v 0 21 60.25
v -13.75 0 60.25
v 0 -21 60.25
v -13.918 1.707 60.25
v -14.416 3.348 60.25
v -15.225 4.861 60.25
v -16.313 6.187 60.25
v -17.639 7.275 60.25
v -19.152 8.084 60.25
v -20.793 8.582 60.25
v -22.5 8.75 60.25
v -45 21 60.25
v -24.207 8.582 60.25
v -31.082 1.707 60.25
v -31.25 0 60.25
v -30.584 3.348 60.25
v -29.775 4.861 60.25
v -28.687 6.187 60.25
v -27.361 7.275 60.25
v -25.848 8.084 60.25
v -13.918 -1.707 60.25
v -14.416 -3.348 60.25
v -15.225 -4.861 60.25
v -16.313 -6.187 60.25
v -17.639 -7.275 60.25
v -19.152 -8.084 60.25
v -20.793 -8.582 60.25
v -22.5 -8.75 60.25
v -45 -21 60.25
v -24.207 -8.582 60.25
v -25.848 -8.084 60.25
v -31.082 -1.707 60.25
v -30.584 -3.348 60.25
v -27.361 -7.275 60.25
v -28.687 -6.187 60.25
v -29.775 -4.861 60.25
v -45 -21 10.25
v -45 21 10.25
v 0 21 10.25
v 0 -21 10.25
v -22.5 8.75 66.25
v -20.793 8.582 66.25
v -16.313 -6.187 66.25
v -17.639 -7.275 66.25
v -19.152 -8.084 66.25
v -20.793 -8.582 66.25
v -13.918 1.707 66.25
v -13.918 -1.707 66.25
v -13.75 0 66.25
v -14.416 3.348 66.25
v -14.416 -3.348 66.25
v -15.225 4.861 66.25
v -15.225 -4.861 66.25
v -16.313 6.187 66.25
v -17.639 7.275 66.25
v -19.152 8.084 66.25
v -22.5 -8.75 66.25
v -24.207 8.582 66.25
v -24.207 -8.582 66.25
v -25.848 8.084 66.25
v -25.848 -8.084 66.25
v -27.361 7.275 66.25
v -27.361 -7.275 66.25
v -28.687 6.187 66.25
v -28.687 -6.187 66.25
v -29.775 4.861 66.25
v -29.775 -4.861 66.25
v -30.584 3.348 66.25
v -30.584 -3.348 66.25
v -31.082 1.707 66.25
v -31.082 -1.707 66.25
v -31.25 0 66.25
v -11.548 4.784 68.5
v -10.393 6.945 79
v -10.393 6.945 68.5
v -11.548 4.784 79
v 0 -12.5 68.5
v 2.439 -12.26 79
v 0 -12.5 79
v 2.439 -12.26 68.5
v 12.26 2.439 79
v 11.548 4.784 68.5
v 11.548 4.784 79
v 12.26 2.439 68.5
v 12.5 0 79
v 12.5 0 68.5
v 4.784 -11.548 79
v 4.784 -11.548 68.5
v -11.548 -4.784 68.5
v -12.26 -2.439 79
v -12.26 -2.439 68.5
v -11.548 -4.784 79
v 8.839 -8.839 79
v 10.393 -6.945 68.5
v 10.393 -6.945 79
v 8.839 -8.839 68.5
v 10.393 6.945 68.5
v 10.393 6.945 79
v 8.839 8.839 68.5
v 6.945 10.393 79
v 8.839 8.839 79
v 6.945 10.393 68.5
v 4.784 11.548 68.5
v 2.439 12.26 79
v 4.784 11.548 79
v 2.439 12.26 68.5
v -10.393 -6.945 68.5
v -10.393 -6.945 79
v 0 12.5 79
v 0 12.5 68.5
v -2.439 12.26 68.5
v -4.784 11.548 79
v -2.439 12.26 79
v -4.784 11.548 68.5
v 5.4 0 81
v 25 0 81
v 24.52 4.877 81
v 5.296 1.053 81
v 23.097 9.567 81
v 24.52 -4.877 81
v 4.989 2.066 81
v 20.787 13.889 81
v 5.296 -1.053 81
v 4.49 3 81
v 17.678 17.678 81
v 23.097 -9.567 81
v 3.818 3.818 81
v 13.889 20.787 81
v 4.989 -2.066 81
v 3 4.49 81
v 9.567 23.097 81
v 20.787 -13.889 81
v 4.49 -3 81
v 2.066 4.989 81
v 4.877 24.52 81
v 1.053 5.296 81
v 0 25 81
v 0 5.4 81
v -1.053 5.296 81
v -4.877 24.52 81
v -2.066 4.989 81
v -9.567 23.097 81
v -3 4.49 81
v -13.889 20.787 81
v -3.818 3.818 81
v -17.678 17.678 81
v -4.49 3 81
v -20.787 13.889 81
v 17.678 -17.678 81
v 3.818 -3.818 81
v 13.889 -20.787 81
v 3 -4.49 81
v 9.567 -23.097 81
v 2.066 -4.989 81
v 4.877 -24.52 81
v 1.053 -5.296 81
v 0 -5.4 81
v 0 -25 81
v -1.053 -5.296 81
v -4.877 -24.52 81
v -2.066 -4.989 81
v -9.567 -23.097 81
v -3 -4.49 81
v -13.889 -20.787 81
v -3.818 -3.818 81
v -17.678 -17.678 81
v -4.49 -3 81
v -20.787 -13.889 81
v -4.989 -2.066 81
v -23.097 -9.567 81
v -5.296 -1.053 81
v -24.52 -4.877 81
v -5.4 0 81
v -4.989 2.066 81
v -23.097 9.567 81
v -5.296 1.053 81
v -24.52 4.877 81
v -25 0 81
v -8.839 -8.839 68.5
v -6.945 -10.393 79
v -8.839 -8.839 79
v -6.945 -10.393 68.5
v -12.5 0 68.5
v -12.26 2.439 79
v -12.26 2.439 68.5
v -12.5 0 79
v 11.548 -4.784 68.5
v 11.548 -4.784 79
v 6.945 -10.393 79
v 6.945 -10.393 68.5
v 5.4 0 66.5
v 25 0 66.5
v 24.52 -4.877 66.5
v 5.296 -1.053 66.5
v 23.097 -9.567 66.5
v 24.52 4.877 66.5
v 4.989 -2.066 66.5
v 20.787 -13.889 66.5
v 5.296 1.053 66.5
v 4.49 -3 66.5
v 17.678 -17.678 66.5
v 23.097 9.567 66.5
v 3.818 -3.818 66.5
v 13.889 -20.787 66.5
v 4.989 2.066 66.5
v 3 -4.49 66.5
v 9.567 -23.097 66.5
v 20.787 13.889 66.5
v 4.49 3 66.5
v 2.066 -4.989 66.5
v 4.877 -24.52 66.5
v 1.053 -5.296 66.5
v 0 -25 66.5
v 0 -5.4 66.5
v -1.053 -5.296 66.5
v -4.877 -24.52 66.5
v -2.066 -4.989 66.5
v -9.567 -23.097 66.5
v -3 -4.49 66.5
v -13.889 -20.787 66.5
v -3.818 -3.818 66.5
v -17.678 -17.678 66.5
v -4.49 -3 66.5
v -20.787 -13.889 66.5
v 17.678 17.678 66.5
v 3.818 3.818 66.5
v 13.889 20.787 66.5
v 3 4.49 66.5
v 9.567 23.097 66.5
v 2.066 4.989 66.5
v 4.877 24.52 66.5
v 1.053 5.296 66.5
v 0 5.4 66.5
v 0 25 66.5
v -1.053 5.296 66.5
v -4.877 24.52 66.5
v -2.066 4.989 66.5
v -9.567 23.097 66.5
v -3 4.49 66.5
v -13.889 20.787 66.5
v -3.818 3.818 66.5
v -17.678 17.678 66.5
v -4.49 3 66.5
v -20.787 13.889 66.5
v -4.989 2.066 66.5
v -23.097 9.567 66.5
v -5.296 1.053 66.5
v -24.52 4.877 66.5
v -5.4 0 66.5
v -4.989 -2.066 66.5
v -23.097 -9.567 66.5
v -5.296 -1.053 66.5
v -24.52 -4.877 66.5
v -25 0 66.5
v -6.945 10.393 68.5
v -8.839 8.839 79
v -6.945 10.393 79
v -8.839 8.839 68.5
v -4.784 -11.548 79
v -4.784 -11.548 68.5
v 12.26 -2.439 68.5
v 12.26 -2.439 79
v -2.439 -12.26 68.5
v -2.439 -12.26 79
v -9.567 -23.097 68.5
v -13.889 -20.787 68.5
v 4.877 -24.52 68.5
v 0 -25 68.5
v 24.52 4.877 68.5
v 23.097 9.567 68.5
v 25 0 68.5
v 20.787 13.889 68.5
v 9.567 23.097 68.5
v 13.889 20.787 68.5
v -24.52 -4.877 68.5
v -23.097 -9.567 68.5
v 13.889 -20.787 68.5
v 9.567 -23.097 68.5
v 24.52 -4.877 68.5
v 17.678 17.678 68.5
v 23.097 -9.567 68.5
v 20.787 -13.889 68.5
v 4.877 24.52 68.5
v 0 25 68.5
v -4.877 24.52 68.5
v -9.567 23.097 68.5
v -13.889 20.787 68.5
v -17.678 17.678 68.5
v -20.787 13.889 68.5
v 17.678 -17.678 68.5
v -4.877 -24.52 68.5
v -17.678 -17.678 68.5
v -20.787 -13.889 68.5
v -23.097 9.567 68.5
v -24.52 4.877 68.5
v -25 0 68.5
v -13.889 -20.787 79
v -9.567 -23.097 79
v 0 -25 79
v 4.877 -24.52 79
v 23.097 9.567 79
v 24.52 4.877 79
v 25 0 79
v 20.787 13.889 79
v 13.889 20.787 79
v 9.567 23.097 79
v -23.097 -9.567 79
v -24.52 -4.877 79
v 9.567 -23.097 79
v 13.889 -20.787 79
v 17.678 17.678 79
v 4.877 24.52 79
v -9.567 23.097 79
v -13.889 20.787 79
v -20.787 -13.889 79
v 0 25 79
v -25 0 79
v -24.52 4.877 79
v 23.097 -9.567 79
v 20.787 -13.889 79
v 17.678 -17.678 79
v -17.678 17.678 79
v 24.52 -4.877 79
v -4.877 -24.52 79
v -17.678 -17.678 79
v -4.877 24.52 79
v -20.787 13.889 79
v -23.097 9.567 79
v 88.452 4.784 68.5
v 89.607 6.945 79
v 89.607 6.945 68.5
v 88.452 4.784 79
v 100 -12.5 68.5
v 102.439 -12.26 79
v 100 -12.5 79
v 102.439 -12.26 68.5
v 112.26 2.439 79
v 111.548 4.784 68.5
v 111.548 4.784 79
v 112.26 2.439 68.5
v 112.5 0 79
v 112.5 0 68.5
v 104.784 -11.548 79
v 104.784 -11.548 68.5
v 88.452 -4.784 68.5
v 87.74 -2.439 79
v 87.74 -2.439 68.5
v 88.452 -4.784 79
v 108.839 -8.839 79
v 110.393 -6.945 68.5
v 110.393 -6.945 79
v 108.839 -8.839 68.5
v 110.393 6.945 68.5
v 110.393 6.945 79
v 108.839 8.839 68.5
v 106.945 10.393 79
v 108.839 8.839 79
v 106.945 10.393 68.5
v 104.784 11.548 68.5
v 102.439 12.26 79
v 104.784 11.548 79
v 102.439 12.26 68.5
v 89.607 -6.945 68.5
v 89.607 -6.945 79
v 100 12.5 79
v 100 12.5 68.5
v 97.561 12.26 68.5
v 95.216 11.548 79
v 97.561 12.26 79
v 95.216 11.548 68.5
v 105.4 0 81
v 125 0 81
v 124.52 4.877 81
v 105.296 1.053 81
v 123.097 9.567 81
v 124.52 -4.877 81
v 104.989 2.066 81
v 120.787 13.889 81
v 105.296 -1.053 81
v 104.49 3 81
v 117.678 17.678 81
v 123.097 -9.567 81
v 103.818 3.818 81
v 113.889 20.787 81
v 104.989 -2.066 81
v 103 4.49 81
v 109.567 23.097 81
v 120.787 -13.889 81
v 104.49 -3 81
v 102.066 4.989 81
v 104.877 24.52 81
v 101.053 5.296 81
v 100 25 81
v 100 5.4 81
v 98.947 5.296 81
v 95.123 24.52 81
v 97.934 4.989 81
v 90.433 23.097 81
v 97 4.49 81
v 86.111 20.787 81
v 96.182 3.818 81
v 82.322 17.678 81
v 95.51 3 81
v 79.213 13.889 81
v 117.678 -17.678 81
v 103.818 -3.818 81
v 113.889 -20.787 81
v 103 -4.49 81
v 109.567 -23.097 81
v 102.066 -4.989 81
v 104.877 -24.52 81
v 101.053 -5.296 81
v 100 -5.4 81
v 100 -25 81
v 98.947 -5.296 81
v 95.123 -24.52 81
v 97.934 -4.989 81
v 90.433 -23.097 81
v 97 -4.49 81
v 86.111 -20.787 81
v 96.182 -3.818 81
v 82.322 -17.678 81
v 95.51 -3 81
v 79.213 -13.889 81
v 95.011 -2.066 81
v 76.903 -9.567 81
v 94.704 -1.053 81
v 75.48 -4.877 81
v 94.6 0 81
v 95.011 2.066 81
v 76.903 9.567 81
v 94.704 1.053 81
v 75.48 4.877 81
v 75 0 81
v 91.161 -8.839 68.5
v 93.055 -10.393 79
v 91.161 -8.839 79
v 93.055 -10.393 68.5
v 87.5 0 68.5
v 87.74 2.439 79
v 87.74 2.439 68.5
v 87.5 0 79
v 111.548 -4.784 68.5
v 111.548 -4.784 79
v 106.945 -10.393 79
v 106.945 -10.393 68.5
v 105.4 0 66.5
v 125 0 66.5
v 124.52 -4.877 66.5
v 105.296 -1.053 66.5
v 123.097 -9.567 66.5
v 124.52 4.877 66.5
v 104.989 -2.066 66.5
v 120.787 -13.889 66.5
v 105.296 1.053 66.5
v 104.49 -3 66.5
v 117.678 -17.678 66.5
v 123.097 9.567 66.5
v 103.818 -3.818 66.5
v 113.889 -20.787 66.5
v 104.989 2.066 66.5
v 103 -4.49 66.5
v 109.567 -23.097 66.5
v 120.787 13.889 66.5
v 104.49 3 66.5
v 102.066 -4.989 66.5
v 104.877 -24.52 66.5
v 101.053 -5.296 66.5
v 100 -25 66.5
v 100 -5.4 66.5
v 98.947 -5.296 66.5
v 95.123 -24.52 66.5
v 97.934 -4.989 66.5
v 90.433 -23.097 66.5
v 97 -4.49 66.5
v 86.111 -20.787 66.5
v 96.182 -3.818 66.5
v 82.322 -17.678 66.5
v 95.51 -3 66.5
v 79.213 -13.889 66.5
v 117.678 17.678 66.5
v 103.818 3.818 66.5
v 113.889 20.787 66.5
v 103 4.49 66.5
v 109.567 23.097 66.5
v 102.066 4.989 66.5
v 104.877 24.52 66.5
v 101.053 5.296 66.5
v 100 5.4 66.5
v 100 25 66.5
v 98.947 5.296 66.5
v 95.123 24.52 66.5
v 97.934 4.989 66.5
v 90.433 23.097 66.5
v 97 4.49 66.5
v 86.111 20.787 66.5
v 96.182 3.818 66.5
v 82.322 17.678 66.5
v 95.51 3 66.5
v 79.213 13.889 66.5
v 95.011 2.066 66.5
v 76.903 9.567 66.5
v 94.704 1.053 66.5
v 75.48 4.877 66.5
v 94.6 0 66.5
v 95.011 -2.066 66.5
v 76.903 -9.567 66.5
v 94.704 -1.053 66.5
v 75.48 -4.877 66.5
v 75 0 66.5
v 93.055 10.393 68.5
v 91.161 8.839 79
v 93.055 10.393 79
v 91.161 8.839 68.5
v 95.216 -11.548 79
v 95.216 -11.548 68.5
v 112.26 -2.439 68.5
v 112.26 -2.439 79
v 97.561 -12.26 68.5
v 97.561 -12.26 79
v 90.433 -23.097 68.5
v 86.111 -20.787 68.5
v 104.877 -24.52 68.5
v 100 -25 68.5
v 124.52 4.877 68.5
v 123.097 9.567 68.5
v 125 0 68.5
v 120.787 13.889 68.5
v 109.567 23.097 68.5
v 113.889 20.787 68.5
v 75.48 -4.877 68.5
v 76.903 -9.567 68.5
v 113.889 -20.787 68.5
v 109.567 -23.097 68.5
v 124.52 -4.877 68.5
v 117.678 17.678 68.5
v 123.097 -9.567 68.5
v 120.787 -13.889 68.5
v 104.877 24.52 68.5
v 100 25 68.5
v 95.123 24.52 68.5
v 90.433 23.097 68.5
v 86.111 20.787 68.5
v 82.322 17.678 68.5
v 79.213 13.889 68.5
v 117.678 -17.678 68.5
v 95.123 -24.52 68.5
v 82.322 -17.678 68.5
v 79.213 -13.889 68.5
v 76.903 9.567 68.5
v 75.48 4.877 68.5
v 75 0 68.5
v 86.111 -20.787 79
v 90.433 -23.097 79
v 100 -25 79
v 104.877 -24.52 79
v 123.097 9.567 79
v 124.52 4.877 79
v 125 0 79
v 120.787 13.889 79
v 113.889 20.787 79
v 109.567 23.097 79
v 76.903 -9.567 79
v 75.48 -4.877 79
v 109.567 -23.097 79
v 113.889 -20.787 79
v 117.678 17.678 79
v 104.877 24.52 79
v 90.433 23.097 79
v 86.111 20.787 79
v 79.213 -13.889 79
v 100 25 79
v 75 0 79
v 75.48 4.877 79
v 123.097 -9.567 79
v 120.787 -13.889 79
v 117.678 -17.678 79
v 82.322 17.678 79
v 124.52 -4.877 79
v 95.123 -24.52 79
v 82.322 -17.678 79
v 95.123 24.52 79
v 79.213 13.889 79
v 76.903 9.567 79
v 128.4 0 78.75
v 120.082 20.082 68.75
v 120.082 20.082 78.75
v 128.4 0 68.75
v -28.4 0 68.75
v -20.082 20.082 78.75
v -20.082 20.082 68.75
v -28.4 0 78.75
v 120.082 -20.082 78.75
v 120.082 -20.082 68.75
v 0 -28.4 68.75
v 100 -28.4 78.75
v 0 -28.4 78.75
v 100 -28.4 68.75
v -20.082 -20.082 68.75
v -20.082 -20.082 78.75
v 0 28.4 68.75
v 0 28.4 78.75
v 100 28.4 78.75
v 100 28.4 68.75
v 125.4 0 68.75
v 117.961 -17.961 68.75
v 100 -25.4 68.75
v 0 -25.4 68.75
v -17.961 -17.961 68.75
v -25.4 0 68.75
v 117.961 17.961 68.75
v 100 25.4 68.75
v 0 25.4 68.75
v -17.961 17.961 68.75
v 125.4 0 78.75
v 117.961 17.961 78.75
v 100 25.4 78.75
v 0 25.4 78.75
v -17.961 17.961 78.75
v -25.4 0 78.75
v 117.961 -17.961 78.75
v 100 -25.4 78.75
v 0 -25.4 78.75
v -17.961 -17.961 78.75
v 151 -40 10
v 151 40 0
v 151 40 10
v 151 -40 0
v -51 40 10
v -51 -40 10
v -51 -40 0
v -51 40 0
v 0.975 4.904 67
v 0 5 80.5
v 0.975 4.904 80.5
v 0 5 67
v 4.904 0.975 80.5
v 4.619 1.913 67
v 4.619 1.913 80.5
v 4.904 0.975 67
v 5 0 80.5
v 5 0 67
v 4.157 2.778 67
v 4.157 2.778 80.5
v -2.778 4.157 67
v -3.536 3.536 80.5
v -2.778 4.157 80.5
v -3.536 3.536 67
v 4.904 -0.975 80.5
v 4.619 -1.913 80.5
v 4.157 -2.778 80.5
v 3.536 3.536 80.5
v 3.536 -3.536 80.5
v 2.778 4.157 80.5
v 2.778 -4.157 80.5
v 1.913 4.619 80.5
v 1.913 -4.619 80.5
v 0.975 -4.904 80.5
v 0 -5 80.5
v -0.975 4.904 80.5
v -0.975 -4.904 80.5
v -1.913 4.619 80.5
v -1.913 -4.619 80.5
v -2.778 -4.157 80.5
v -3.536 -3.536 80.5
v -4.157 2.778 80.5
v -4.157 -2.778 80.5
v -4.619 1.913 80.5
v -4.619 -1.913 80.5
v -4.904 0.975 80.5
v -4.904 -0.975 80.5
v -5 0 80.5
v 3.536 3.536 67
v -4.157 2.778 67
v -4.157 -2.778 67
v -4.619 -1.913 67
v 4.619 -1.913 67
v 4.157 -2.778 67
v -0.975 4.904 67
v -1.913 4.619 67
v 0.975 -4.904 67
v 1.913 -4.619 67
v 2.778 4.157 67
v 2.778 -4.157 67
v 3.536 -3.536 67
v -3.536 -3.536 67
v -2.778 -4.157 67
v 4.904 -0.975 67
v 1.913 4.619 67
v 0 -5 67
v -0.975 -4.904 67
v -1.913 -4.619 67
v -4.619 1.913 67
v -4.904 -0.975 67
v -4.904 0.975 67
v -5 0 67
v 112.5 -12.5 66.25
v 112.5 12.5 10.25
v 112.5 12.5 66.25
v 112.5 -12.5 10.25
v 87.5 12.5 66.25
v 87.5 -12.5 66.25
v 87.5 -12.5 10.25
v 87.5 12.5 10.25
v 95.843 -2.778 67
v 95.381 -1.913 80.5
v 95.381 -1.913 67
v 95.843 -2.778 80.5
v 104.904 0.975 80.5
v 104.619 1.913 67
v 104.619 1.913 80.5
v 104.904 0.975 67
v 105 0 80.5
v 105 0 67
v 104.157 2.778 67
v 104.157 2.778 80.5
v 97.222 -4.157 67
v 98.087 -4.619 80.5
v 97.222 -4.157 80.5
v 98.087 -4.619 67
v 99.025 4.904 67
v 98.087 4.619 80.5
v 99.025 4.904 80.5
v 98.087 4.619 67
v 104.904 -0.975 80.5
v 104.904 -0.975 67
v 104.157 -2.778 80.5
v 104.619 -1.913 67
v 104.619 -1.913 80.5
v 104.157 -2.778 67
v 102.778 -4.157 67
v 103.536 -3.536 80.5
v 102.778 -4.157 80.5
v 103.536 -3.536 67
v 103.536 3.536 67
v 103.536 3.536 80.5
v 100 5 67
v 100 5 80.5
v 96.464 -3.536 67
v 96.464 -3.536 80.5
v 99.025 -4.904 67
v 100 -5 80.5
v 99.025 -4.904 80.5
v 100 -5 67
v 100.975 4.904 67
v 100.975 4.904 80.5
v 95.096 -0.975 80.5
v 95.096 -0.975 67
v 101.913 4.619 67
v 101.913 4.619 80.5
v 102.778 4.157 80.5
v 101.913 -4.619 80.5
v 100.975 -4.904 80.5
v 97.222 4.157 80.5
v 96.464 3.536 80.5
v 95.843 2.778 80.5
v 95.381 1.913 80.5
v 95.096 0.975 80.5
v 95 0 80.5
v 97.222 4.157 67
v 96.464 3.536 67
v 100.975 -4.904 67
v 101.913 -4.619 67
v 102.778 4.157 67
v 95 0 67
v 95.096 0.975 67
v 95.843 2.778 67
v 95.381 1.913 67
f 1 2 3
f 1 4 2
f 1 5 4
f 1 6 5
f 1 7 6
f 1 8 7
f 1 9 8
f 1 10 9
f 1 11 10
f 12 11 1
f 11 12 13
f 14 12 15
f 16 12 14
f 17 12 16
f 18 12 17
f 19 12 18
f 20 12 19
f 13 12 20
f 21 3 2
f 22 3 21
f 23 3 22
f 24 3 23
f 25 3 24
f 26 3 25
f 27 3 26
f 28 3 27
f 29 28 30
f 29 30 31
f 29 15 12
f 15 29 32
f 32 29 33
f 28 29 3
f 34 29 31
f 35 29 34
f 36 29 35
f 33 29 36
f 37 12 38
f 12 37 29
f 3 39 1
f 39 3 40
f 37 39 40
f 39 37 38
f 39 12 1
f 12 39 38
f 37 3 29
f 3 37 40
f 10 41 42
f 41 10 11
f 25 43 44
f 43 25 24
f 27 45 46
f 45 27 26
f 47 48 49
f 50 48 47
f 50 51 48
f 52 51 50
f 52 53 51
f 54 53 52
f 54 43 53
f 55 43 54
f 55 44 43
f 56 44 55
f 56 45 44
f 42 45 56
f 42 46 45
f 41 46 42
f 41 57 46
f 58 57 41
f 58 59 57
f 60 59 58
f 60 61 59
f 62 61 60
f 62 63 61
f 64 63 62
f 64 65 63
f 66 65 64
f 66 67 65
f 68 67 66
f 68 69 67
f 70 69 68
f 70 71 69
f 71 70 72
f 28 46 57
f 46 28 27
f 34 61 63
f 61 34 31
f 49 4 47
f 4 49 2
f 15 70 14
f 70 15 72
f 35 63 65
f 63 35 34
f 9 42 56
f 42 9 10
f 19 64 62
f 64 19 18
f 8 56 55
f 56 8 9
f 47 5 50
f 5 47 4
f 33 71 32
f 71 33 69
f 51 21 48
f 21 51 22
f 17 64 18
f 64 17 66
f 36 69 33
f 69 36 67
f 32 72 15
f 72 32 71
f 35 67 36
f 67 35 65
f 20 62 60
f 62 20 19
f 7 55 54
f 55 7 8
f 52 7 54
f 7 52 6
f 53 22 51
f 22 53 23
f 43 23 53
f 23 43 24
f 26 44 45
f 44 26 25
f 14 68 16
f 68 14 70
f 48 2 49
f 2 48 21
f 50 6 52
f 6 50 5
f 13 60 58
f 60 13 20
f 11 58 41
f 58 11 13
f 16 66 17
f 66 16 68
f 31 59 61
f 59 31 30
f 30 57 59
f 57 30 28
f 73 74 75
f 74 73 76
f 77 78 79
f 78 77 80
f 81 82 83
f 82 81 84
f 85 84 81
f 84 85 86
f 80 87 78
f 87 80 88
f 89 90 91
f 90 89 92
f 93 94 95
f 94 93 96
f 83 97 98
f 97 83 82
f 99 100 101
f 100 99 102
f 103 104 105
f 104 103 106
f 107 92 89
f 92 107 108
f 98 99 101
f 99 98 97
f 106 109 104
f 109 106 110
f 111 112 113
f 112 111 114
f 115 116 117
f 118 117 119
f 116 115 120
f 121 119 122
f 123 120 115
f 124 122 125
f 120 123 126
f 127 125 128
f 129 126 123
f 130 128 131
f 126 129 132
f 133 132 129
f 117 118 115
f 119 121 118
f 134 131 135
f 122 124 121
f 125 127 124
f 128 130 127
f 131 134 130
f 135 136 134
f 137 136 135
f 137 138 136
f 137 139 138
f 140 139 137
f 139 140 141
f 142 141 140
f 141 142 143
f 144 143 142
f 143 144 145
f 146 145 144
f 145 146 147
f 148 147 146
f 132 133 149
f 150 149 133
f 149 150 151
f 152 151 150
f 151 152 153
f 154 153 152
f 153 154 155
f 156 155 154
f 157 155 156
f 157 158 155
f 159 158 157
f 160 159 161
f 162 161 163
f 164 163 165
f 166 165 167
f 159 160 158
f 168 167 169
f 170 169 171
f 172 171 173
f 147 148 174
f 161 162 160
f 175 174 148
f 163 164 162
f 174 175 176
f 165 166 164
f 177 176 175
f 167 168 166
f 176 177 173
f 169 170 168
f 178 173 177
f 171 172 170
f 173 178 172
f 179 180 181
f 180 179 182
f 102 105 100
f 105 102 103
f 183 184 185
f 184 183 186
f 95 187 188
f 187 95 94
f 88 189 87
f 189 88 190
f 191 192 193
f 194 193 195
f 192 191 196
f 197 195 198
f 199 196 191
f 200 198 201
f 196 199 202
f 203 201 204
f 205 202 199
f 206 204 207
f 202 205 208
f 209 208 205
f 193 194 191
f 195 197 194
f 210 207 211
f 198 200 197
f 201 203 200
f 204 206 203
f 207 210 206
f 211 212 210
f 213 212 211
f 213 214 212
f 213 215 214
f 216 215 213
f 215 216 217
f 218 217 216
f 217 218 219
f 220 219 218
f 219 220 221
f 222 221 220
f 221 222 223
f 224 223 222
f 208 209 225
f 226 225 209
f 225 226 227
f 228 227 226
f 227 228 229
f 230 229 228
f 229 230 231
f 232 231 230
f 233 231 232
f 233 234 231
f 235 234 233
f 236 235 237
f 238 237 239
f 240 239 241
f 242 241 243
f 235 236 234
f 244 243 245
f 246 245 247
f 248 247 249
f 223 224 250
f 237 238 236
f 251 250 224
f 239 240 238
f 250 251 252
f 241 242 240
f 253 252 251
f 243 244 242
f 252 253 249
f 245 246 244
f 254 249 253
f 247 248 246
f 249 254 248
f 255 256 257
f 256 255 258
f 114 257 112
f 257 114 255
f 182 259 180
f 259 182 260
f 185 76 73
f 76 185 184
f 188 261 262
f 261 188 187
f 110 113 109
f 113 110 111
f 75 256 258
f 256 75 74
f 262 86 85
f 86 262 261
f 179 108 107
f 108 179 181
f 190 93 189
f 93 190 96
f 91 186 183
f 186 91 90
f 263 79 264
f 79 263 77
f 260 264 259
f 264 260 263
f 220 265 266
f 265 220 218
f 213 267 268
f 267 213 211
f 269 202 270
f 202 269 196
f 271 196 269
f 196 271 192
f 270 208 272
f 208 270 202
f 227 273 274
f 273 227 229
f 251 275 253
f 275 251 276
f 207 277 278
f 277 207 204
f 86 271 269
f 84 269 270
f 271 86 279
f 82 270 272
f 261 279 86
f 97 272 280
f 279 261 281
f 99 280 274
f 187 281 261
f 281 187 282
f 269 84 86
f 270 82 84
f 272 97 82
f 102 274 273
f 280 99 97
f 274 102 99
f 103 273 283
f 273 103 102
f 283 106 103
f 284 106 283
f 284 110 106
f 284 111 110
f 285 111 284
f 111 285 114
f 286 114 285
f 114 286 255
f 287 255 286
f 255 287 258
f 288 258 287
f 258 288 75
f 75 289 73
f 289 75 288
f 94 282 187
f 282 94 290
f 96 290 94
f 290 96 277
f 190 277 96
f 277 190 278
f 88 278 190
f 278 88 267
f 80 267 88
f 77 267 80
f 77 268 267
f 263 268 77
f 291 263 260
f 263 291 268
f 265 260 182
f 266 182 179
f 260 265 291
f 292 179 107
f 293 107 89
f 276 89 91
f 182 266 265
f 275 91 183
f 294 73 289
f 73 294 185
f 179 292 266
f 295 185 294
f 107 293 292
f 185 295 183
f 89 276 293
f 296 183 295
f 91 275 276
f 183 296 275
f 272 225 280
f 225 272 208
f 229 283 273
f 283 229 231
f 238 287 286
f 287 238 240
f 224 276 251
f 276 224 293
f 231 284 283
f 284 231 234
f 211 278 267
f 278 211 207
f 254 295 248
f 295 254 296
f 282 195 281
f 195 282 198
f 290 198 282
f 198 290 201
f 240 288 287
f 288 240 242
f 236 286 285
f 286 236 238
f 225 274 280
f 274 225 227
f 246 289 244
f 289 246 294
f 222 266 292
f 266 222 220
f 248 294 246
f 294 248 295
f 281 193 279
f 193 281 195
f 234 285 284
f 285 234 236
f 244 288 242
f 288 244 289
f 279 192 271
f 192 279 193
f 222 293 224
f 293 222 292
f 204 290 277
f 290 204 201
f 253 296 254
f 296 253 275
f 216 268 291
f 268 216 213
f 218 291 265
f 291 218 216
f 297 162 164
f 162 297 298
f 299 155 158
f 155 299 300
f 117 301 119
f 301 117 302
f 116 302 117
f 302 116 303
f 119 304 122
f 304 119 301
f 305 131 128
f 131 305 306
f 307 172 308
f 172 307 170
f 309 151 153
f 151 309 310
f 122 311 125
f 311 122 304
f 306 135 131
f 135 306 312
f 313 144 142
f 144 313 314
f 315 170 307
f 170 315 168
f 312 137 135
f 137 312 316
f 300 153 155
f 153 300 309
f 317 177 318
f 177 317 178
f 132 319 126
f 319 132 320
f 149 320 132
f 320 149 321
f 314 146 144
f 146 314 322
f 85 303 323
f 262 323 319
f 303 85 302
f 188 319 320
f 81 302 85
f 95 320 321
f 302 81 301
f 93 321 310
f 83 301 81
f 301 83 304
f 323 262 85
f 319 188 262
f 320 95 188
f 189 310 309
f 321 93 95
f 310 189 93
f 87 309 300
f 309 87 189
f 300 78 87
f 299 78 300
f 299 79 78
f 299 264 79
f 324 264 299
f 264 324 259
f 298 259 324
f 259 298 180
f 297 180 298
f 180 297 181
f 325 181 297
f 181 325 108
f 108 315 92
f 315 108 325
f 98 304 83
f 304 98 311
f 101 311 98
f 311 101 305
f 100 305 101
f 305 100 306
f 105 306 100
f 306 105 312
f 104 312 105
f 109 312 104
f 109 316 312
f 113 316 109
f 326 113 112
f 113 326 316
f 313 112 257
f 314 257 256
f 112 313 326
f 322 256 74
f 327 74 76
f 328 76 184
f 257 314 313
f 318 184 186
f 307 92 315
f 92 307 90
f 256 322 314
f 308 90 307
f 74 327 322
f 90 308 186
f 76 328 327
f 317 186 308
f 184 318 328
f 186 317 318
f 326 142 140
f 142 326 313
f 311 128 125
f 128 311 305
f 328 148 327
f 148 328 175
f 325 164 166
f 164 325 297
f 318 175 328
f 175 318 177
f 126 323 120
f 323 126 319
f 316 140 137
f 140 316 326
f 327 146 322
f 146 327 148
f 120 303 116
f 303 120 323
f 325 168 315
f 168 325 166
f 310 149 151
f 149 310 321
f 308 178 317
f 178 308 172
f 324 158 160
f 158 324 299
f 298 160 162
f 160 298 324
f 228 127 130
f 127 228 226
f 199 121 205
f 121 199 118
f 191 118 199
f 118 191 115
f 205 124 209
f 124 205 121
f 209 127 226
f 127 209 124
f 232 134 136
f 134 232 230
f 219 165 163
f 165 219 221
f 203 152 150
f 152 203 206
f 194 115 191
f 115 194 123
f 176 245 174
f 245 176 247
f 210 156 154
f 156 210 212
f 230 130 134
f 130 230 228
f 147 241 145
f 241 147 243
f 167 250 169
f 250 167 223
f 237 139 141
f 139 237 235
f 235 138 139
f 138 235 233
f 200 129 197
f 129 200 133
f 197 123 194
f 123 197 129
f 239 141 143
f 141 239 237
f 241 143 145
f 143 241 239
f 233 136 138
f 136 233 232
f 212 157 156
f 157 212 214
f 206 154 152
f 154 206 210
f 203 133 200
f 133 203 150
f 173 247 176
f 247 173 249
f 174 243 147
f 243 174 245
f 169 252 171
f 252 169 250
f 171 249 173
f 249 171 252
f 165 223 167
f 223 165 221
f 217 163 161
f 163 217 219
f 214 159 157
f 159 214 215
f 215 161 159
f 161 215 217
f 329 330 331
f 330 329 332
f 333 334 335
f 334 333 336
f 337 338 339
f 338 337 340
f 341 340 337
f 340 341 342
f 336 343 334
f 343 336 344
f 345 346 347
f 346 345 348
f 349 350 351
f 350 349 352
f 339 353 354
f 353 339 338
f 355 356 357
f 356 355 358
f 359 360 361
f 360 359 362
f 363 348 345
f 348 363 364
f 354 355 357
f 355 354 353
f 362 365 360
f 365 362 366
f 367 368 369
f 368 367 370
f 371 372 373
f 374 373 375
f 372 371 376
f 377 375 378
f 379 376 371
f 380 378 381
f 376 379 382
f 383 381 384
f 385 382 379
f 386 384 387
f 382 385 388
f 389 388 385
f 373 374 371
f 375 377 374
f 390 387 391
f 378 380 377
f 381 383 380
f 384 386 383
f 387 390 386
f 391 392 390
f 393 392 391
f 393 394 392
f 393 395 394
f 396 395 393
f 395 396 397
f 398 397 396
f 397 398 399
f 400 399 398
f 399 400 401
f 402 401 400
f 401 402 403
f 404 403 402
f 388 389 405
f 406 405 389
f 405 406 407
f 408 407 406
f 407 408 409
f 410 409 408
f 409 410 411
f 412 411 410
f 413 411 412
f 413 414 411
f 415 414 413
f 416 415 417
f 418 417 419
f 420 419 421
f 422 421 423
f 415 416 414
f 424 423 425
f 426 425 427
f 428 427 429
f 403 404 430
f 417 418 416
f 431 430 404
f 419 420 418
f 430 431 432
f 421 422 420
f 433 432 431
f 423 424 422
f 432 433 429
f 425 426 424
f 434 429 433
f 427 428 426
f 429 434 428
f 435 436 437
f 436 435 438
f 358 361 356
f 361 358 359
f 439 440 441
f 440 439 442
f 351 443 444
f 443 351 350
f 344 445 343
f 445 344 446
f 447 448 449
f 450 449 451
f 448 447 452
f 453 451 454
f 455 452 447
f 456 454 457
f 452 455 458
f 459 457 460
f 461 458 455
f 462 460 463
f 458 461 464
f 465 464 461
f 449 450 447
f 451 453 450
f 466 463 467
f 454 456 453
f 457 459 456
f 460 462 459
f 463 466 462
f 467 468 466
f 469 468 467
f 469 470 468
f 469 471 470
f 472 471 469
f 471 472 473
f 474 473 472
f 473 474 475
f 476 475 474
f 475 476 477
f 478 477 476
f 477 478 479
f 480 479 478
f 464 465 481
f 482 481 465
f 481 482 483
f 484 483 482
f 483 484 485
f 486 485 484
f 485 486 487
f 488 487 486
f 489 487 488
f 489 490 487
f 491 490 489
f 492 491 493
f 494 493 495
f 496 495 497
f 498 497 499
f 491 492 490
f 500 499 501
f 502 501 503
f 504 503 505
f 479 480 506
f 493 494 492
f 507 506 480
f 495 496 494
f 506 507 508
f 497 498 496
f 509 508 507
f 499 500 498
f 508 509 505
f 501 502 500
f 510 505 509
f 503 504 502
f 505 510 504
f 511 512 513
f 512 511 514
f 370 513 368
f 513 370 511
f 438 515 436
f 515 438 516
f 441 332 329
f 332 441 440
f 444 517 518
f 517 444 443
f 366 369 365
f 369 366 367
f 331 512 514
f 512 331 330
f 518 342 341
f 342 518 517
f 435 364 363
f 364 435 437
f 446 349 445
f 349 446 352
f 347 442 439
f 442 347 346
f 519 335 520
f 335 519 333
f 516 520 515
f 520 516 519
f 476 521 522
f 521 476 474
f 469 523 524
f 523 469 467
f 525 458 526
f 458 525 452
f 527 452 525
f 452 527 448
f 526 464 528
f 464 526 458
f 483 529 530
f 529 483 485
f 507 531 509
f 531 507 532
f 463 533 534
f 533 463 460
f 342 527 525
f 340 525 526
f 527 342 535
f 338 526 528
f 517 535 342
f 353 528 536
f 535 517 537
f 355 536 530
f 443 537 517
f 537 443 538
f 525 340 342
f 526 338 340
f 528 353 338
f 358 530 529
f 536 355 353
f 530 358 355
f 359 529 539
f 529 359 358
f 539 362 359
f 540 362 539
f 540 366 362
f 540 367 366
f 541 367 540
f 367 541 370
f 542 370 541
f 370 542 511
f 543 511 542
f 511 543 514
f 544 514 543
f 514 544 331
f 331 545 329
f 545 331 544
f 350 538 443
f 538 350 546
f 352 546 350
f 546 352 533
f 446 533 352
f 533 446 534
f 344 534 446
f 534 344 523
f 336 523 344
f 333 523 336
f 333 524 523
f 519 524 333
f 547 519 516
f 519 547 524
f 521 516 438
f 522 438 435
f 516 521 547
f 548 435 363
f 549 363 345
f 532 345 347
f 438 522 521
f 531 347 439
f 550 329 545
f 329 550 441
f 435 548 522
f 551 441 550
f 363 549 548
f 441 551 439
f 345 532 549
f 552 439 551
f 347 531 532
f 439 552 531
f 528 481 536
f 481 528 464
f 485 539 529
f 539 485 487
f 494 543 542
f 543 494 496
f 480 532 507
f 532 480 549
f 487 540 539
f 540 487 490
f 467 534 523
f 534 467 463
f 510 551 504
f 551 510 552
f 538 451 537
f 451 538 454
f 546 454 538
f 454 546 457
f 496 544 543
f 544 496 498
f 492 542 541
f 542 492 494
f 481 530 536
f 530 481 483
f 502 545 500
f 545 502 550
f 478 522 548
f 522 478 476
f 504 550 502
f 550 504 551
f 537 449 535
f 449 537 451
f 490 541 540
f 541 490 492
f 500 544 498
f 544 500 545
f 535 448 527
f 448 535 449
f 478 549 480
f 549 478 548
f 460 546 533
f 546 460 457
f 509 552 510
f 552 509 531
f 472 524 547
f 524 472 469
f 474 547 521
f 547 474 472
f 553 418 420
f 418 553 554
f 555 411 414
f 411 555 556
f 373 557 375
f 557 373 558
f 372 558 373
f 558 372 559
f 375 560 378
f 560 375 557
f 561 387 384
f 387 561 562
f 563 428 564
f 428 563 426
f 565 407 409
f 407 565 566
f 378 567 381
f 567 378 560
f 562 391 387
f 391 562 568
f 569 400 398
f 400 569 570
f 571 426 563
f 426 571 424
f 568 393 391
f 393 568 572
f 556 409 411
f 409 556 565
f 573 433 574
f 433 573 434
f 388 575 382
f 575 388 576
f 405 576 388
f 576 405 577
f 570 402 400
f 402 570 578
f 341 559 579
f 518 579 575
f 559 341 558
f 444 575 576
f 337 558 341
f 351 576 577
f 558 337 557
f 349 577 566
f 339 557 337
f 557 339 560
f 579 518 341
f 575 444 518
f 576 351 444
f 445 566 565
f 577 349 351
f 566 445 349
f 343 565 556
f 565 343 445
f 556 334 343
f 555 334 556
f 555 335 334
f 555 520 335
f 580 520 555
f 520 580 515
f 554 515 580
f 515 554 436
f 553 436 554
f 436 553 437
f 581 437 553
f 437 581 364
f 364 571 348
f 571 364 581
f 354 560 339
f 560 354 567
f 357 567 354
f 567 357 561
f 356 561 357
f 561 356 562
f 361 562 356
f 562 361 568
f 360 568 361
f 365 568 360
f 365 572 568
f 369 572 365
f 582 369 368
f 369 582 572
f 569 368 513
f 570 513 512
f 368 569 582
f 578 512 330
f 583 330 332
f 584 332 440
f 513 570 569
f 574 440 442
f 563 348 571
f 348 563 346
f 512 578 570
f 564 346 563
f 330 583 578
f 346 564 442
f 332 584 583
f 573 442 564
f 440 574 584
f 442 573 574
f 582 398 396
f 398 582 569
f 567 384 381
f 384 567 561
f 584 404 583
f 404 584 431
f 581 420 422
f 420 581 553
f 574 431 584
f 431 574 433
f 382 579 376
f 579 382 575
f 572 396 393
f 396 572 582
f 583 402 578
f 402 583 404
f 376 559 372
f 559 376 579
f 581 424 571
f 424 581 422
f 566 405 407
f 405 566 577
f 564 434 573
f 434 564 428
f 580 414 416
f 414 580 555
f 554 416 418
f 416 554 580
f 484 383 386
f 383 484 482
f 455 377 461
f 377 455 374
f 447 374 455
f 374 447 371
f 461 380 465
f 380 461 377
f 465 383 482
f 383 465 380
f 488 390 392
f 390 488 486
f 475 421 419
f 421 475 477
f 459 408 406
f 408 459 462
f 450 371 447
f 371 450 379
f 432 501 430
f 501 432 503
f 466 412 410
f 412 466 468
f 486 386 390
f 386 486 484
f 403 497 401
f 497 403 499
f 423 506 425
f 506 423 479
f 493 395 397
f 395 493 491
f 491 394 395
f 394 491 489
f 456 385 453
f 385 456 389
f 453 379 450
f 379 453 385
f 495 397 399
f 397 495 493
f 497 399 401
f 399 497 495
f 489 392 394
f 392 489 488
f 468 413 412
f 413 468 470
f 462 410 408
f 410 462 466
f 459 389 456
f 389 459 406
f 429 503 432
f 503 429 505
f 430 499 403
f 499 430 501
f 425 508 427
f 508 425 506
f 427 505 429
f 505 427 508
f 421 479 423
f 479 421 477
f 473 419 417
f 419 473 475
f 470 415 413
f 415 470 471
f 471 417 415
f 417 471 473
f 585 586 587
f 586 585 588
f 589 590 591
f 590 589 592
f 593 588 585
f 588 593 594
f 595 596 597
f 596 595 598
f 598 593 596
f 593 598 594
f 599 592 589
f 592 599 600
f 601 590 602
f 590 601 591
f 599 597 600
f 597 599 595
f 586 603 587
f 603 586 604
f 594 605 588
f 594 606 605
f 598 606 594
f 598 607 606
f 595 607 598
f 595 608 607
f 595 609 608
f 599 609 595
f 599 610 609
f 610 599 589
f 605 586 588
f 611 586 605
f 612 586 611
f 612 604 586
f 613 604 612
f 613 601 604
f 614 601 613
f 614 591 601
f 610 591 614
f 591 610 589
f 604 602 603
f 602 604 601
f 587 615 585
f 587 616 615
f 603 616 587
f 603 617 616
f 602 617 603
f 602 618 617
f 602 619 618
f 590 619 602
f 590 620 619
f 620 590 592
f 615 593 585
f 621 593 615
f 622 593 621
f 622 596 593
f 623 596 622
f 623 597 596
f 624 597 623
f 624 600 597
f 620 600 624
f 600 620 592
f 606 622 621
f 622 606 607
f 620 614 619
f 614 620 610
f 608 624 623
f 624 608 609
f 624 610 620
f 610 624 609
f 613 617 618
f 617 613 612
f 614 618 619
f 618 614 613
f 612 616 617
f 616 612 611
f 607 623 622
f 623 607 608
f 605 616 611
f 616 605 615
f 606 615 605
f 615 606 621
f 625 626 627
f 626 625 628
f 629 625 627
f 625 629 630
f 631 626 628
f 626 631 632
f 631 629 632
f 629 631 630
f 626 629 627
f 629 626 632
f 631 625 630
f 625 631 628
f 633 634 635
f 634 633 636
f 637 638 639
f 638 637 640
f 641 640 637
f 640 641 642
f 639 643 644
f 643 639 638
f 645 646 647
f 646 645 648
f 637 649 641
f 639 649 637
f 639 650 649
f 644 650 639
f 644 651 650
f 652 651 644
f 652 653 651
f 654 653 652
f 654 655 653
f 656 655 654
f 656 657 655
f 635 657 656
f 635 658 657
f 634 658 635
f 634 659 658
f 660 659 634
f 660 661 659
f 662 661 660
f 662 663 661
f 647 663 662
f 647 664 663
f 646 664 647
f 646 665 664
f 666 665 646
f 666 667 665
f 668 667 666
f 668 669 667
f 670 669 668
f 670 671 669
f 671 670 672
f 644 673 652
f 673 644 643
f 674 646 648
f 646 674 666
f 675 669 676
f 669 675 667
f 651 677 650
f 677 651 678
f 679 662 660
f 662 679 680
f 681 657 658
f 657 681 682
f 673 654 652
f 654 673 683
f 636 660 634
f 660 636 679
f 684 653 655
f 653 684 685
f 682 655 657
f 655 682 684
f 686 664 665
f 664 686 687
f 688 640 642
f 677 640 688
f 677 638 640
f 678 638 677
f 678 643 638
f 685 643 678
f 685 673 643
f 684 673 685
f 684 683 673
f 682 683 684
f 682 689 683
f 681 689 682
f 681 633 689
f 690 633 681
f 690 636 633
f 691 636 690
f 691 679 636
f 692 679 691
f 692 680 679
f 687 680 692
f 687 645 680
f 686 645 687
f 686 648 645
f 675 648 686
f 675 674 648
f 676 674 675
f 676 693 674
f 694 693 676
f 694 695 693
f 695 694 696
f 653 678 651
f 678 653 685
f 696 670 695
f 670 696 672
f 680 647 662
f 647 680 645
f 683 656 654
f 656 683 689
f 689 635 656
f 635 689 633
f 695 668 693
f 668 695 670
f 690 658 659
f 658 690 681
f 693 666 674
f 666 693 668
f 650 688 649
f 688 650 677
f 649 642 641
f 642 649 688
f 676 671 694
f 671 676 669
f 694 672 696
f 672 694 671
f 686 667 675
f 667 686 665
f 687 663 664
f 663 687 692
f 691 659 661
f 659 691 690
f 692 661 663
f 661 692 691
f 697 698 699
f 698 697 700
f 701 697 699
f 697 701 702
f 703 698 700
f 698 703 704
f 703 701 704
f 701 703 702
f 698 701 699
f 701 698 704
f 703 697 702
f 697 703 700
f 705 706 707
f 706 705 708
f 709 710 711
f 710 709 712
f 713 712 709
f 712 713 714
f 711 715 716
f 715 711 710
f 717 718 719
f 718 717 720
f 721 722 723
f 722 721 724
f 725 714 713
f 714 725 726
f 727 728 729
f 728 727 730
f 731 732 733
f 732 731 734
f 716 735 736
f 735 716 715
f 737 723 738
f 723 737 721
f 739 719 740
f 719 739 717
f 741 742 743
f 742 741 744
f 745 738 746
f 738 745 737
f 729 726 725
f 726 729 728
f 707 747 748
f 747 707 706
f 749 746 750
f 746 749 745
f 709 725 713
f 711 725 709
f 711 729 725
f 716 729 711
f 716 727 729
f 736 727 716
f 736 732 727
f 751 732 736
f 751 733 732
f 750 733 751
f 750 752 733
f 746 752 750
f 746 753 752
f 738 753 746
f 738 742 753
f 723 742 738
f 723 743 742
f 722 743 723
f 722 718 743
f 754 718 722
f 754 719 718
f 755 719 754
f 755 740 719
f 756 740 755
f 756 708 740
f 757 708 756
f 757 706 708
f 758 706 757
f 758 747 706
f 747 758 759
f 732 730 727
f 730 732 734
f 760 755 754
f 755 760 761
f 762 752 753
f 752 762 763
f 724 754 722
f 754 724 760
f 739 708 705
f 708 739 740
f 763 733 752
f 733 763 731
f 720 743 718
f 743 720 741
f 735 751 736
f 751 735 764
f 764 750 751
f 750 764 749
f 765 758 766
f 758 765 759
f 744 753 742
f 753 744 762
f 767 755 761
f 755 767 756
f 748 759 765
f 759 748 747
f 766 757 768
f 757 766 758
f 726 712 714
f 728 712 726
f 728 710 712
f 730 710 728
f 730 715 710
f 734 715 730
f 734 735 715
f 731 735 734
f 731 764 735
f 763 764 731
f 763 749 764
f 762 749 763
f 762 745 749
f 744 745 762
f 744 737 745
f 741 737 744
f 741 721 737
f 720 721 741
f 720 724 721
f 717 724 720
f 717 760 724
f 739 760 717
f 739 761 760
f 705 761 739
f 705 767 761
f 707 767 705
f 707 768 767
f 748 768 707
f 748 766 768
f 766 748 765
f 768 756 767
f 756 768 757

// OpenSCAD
$fn = 32;

// ------------------------------------------------------------------------
// Motor belt drive: span 100 mm, pulleys d50, belt 10 mm wide
// Every part is its own module, assembly() places every instance.
// ------------------------------------------------------------------------

// --- part 1 ---
module base_plate() {
  difference() {
    translate([-101, -40, 0]) cube([202, 80, 10]);
  }
}

// --- part 2 ---
module motor() {
  union() {
    translate([-25, -21, 0]) cube([50, 42, 45]);
    translate([28, 0, 22.5]) rotate([0, 90, 0]) cylinder(h = 6, d = 17.5, center = true);
  }
}

// --- part 3 ---
module drive_shaft() {
  translate([0, 0, -6.75]) cylinder(h = 13.5, d = 10);
}

// --- part 4 ---
module pulley_drive() {
  difference() {
    union() {
      cylinder(h = 14.5, d = 25);
      cylinder(h = 2, d = 50);
      translate([0, 0, 12.5]) cylinder(h = 2, d = 50);
    }
    translate([0, 0, -1]) cylinder(h = 16.5, d = 10.8);
  }
}

// --- part 5 ---
module idler_post() {
  translate([-12.5, -12.5, 0]) cube([25, 25, 56]);
}

// --- part 6 ---
module driven_shaft() {
  translate([0, 0, -6.75]) cylinder(h = 13.5, d = 10);
}

// --- part 7 ---
module pulley_driven() {
  difference() {
    union() {
      cylinder(h = 14.5, d = 25);
      cylinder(h = 2, d = 50);
      translate([0, 0, 12.5]) cylinder(h = 2, d = 50);
    }
    translate([0, 0, -1]) cylinder(h = 16.5, d = 10.8);
  }
}

// --- part 8 ---
module drive_belt() {
  difference() {
    linear_extrude(height = 10) polygon(points = concat([for (a = [90 : 45 : 270]) [28.4 * cos(a), 28.4 * sin(a)]], [for (a = [270 : 45 : 450]) [100 + 28.4 * cos(a), 28.4 * sin(a)]]));
    translate([0, 0, -1]) linear_extrude(height = 12) polygon(points = concat([for (a = [90 : 45 : 270]) [25.4 * cos(a), 25.4 * sin(a)]], [for (a = [270 : 45 : 450]) [100 + 25.4 * cos(a), 25.4 * sin(a)]]));
  }
}

// --- assembly ---
module assembly() {
  color([0.80, 0.24, 0.20]) translate([50, 0, 0]) rotate([0, 0, 0]) base_plate();
  color([0.20, 0.45, 0.75]) translate([0, 0, 35.25]) rotate([0, 270, 0]) motor();
  color([0.25, 0.62, 0.32]) translate([0, 0, 73.75]) rotate([0, 0, 0]) drive_shaft();
  color([0.92, 0.70, 0.18]) translate([0, 0, 66.5]) rotate([0, 0, 0]) pulley_drive();
  color([0.58, 0.35, 0.70]) translate([100, 0, 10.25]) rotate([0, 0, 0]) idler_post();
  color([0.16, 0.66, 0.66]) translate([100, 0, 73.75]) rotate([0, 0, 0]) driven_shaft();
  color([0.85, 0.48, 0.18]) translate([100, 0, 66.5]) rotate([0, 0, 0]) pulley_driven();
  color([0.55, 0.60, 0.65]) translate([0, 0, 68.75]) rotate([0, 0, 0]) drive_belt();
}

assembly();
